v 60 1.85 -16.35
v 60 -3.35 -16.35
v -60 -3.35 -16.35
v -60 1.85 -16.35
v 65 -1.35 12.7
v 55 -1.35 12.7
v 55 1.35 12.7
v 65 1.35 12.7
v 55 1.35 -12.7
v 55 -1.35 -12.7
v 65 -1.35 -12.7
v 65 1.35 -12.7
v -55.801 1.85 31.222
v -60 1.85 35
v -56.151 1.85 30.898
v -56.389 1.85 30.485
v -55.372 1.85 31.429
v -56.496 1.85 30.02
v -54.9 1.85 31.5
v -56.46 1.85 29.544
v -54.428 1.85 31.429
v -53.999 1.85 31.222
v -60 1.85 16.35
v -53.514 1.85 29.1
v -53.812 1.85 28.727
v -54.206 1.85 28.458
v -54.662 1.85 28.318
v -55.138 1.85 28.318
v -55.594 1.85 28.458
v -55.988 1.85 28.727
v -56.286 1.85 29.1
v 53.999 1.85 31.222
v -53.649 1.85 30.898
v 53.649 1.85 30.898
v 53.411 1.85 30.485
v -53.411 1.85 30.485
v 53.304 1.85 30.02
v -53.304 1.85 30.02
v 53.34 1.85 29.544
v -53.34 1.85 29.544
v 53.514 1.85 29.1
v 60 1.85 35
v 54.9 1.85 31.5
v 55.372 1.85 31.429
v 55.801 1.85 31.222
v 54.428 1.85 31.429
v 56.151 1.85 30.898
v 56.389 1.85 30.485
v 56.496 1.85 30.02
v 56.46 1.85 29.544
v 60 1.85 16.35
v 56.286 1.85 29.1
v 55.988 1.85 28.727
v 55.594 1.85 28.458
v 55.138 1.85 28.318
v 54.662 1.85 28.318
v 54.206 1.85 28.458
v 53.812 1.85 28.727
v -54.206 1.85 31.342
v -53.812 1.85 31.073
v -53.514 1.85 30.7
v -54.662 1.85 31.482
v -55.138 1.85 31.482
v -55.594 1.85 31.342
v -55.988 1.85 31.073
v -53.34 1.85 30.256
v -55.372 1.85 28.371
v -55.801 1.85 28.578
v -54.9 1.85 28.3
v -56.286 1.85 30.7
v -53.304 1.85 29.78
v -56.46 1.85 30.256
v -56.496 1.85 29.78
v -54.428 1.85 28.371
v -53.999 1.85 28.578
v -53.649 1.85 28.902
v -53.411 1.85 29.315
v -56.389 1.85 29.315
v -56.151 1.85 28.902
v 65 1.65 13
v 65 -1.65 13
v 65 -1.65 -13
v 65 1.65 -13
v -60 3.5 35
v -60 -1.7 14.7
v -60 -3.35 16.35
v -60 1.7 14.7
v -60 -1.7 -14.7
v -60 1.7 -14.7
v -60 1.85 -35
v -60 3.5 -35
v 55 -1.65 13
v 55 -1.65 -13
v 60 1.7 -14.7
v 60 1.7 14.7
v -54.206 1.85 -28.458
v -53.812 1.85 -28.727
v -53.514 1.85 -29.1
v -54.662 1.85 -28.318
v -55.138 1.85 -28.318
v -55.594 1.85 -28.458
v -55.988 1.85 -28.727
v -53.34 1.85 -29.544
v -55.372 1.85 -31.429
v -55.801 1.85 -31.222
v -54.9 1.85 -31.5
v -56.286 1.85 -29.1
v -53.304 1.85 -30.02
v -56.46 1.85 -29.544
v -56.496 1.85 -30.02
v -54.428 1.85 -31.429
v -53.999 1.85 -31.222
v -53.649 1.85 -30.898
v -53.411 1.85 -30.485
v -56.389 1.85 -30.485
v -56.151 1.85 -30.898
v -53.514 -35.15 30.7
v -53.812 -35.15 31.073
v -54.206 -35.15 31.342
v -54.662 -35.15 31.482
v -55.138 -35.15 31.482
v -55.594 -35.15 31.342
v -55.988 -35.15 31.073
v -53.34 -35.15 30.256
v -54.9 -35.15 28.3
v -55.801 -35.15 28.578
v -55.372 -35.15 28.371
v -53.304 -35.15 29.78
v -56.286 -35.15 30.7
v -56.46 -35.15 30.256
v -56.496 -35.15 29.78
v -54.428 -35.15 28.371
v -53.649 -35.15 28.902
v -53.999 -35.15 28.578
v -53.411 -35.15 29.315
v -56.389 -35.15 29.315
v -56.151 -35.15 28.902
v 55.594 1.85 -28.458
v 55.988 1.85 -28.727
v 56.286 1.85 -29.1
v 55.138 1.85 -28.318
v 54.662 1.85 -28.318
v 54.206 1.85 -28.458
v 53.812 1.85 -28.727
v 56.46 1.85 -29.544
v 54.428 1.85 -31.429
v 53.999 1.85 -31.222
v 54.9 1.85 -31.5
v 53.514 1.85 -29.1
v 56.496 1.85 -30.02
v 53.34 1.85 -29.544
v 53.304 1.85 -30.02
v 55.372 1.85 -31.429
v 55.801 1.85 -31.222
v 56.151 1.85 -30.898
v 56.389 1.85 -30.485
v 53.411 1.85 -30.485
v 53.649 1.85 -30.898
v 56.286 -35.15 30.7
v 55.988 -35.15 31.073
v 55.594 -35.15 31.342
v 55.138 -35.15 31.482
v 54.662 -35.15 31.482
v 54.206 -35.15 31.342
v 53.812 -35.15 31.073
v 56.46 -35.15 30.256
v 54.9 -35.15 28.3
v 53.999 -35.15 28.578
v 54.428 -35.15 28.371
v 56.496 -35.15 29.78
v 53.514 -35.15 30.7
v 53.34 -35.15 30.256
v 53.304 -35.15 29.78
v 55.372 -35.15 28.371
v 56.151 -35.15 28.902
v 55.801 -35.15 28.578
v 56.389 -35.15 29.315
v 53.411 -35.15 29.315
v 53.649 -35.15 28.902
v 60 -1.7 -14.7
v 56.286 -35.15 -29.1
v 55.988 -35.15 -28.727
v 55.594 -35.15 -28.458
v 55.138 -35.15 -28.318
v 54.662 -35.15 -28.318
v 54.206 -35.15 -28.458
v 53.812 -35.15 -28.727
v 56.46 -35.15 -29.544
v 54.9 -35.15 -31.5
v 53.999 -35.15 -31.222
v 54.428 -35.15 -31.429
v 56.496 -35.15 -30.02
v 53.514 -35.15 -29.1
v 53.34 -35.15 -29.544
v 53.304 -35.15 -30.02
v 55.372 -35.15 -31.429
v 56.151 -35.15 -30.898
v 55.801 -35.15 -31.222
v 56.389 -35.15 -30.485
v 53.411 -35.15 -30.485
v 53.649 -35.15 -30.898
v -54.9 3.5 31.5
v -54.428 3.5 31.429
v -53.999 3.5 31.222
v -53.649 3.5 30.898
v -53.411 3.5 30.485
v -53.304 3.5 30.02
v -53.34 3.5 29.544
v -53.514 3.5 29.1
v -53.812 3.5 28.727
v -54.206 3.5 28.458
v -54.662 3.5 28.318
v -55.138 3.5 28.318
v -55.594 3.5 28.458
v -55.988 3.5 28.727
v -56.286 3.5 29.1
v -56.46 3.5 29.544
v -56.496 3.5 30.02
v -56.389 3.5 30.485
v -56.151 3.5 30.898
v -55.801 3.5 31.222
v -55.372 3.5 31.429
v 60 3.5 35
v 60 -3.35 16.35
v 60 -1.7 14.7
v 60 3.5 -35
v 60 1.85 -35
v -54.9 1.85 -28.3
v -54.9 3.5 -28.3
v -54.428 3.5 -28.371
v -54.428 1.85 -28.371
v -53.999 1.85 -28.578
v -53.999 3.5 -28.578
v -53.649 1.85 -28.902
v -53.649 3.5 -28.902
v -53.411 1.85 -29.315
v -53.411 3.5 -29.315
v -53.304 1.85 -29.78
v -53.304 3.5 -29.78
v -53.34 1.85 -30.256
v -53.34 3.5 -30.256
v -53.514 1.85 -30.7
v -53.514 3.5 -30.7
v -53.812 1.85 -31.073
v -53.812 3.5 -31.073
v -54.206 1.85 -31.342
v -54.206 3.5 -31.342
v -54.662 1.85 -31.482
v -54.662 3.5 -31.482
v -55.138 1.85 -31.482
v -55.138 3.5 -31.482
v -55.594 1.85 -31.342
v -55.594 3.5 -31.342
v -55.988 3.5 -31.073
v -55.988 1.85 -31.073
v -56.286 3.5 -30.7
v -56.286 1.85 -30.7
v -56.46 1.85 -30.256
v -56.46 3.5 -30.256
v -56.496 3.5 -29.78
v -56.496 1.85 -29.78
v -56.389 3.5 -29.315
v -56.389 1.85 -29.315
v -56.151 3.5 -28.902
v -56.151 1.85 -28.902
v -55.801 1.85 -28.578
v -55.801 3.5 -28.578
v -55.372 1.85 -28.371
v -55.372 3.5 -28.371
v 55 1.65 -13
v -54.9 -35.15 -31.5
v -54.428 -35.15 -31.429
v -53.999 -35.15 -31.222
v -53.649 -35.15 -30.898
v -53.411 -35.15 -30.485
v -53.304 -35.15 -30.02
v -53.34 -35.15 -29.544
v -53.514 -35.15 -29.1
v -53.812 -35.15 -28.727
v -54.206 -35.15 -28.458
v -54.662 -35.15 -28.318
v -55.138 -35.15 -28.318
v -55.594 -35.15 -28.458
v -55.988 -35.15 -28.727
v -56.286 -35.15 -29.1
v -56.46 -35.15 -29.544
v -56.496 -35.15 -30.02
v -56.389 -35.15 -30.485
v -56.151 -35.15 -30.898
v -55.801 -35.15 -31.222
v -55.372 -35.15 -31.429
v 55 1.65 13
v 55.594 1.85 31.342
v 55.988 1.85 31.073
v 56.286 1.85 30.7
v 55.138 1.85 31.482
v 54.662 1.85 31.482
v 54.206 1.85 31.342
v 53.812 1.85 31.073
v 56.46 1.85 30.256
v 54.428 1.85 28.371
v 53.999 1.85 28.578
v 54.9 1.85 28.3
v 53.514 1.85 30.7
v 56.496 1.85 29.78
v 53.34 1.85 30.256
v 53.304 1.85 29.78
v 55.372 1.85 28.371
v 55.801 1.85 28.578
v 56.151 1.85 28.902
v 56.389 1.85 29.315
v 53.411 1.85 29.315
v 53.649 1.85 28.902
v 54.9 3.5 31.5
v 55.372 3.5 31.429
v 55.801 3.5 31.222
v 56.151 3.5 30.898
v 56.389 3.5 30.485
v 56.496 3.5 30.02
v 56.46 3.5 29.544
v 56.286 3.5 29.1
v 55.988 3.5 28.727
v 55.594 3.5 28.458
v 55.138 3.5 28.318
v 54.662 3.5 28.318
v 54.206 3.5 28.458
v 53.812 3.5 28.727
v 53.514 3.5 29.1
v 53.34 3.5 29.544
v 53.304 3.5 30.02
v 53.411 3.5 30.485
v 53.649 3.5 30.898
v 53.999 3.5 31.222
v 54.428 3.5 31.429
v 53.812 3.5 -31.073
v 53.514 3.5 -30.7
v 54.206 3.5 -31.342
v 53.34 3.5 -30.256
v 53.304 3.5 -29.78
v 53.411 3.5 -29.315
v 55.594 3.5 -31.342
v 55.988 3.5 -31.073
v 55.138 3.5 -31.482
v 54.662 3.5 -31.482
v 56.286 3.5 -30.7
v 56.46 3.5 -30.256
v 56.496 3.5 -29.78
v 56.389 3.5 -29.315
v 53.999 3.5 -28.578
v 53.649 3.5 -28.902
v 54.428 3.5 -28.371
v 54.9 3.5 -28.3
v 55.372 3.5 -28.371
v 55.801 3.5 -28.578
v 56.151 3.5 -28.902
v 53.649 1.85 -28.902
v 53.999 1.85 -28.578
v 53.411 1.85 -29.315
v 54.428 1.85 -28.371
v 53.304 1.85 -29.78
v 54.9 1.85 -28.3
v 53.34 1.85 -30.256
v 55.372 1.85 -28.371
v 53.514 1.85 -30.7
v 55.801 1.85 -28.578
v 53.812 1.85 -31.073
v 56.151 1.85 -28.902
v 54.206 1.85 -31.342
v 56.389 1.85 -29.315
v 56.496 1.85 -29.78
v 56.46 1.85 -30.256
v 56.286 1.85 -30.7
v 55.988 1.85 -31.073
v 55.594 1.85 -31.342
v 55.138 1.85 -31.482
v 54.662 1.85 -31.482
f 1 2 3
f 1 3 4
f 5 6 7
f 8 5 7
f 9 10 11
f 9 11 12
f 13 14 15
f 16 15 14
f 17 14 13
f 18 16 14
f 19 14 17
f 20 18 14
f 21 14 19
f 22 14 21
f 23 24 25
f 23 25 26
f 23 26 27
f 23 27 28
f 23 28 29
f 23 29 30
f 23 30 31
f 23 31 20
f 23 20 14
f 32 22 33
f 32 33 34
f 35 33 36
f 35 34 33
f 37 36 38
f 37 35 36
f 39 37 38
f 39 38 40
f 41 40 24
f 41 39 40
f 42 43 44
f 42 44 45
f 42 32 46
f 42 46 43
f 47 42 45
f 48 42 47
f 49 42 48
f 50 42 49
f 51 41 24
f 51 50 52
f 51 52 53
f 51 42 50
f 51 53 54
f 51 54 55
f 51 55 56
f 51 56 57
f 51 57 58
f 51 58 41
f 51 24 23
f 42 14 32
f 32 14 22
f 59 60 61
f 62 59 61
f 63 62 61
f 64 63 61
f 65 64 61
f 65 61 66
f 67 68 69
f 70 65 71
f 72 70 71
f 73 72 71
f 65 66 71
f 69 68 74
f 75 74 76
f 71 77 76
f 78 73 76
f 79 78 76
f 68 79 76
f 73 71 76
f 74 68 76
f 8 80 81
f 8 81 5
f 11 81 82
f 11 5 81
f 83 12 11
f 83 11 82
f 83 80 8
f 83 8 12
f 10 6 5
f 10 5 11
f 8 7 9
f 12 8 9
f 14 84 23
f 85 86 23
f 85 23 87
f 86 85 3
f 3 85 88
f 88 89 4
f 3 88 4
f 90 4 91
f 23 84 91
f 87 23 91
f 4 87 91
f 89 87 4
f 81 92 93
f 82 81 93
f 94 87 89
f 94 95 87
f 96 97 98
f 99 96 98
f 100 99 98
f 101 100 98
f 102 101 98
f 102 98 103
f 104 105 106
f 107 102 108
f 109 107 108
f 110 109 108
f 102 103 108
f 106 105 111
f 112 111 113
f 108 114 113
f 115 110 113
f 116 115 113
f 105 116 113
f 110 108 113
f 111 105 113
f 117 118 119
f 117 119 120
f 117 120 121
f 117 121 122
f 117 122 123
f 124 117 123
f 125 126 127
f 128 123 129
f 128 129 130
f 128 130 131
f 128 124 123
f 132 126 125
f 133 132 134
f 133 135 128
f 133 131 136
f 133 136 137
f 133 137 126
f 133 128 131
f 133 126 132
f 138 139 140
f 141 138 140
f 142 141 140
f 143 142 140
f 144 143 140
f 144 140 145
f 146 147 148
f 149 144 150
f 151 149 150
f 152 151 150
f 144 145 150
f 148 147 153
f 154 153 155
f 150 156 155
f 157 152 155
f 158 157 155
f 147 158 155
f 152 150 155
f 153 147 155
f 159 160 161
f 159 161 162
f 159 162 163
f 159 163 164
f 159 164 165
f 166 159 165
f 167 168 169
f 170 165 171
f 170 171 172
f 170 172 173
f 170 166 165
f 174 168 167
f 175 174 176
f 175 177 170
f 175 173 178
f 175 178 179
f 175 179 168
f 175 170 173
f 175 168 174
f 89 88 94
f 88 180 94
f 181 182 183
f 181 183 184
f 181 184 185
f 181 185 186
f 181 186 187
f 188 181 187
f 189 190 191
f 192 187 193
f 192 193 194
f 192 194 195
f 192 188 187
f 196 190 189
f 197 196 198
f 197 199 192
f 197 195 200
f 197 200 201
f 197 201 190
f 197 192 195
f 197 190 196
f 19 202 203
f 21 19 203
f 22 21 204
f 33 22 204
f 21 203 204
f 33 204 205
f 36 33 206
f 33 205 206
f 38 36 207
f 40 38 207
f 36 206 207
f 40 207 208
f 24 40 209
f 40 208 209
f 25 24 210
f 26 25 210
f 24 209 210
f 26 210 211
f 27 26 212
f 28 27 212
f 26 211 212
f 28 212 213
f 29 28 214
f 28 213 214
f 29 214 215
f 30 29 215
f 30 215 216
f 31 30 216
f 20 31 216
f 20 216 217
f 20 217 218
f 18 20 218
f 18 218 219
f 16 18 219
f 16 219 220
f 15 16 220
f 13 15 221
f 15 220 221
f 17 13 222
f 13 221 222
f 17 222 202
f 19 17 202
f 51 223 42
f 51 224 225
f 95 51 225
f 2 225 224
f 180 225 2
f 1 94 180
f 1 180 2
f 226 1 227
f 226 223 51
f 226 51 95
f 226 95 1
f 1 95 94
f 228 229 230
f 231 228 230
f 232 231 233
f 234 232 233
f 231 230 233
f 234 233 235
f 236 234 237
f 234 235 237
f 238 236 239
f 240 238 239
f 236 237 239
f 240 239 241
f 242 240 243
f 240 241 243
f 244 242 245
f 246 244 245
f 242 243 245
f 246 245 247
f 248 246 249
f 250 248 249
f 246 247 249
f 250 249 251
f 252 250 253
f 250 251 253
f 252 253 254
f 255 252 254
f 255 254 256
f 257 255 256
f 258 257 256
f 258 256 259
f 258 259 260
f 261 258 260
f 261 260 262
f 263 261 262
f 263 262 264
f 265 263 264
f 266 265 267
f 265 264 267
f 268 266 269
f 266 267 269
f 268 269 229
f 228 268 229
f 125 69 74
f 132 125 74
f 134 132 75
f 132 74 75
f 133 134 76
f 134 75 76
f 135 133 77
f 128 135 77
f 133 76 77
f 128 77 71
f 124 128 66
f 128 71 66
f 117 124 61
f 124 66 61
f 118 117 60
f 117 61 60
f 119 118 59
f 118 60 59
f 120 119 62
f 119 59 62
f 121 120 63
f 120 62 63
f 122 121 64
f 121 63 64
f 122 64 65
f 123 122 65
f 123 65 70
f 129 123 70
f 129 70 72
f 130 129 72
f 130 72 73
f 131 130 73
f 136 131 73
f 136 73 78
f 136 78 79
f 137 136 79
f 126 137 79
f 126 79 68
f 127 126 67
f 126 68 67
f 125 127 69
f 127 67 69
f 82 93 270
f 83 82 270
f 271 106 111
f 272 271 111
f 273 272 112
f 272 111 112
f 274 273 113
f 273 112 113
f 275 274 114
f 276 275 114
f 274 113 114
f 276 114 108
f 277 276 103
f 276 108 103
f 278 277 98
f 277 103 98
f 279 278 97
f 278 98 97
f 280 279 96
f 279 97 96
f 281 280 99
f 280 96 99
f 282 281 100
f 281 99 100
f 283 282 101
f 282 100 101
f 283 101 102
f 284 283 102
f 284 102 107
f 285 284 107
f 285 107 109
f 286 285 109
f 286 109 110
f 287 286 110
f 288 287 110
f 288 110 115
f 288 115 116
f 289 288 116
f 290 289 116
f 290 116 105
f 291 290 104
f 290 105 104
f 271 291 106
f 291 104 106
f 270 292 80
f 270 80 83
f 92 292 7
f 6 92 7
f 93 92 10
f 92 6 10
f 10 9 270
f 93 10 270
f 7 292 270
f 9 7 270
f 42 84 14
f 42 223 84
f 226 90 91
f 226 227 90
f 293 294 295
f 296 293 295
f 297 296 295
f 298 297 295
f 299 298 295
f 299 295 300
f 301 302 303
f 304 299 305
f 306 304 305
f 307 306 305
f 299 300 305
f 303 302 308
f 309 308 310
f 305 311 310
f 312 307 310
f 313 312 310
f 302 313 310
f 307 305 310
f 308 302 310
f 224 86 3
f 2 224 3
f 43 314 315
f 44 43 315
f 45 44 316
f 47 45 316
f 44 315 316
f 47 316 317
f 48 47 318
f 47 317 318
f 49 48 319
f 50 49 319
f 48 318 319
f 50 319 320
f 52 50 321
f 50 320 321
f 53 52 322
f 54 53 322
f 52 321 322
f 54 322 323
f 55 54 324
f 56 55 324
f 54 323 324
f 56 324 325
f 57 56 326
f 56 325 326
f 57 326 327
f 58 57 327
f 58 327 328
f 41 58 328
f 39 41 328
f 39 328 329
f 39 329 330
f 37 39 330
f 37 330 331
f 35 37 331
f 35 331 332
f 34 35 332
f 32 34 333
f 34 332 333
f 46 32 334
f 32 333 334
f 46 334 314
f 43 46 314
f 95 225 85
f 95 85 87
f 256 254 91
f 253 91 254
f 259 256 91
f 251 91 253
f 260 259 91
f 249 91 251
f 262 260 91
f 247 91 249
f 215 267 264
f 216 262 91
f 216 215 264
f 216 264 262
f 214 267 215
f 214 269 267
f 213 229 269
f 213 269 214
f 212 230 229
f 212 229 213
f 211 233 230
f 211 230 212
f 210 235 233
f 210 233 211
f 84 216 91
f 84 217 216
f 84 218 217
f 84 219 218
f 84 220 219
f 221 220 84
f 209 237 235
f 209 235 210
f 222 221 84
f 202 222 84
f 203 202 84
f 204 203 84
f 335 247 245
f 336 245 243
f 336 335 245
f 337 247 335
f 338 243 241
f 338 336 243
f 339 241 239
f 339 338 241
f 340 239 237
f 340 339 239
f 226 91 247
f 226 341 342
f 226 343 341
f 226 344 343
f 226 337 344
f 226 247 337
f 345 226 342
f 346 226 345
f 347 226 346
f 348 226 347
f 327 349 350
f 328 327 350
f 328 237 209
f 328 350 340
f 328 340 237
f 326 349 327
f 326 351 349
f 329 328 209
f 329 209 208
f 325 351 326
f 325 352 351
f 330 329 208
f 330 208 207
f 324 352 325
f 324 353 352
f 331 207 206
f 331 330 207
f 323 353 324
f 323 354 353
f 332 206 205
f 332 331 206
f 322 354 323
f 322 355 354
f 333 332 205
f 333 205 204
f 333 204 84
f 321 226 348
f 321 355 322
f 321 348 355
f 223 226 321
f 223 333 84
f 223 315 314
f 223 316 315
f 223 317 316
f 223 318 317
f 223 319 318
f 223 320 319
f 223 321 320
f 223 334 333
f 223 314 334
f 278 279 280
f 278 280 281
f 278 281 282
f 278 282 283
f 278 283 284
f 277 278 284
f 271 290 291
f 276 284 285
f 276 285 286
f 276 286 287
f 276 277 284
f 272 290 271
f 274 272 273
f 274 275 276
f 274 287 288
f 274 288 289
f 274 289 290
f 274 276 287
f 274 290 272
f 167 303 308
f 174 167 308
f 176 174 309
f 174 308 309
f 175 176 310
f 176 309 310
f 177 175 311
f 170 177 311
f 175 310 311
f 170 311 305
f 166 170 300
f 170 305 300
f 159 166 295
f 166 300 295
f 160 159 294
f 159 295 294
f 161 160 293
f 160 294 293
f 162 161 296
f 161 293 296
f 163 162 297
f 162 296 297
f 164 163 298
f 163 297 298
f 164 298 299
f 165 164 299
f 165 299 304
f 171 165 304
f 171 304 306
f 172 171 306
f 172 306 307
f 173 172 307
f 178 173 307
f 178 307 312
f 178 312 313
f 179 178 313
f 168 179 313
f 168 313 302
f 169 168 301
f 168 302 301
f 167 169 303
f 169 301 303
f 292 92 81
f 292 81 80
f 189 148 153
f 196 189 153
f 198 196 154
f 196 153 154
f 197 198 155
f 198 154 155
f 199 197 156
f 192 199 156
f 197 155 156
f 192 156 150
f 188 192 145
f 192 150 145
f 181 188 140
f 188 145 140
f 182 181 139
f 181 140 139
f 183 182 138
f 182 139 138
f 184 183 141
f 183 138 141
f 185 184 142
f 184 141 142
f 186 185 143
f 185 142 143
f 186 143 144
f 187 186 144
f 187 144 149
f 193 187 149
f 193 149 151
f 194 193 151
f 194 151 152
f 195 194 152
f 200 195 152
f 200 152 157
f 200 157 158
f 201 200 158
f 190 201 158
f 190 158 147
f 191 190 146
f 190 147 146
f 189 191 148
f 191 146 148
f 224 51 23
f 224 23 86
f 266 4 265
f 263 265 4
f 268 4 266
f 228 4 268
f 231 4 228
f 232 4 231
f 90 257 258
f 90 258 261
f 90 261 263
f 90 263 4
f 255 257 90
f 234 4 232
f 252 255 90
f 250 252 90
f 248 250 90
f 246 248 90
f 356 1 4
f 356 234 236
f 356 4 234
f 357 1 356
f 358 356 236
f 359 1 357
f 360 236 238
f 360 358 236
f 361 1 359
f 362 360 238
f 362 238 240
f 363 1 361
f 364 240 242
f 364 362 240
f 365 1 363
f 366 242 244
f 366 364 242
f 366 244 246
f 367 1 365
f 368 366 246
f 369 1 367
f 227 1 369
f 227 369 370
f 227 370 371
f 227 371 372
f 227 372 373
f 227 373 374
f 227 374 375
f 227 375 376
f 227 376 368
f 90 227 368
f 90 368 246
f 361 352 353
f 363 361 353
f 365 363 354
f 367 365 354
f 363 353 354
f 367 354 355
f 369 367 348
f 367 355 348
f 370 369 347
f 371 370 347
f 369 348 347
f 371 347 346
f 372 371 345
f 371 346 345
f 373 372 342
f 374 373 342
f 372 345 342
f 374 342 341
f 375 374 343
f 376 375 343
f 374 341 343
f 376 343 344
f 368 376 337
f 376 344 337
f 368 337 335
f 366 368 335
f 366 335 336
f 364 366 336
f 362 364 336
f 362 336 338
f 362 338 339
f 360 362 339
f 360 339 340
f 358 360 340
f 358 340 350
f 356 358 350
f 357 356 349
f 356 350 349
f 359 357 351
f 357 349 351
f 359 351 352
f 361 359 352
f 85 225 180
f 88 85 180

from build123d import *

# Parameters (mm, degrees)
SKETCH1_W                = 29.4
SKETCH1_H                = 3.4
BOSS_EXTRUDE1_DEPTH      = 60
SKETCH2_R                = 1.6
CUT_EXTRUDE2_DEPTH       = 1.65
BOSS_EXTRUDE2_DEPTH      = 5
BOSS_EXTRUDE2_DEPTH_BACK = 5
SKETCH3_W                = 26
SKETCH3_H                = 3.3
SKETCH3_W_2              = 25.4
SKETCH3_H_2              = 2.7
SKETCH4_R                = 1.6
BOSS_EXTRUDE3_DEPTH      = 37
BOSS_EXTRUDE3_2_DEPTH    = 37
BOSS_EXTRUDE3_3_DEPTH    = 37
BOSS_EXTRUDE3_4_DEPTH    = 37


with BuildPart() as part:
    # Sketch1 → Boss-Extrude1 (new, symmetric)
    with BuildSketch(Plane(origin=(0, 0, 0), x_dir=(0, 0, -1), z_dir=(1, 0, 0))):
        Polygon((-35, 1.85), (-16.35, 1.85), (-16.35, -3.35), (16.35, -3.35), (16.35, 1.85), (35, 1.85), (35, 3.5), (-35, 3.5), align=None)
        Rectangle(SKETCH1_W, SKETCH1_H, mode=Mode.SUBTRACT)
    extrude(amount=BOSS_EXTRUDE1_DEPTH, both=True)

    # Sketch2 → Cut-Extrude2 (cut)
    with BuildSketch(Plane(origin=(0, 3.5, 0), x_dir=(1, 0, 0), z_dir=(0, 1, 0))):
        with Locations(Location((-54.9, 29.9, 0), (0, 0, 270))):
            Circle(SKETCH2_R)
        with Locations(Location((-54.9, -29.9, 0), (0, 0, 270))):
            Circle(SKETCH2_R)
        with Locations(Location((54.9, -29.9, 0), (0, 0, 270))):
            Circle(SKETCH2_R)
        with Locations(Location((54.9, 29.9, 0), (0, 0, 270))):
            Circle(SKETCH2_R)
    extrude(amount=-CUT_EXTRUDE2_DEPTH, mode=Mode.SUBTRACT)


with BuildPart() as body_2:
    # Sketch3 → Boss-Extrude2 (new, two sides: drawn at the far end of the back side and taken through both)
    with BuildSketch(Plane(origin=(60, 0, 0), x_dir=(0, 0, -1), z_dir=(1, 0, 0)).offset(-BOSS_EXTRUDE2_DEPTH_BACK)):
        Rectangle(SKETCH3_W, SKETCH3_H)
        Rectangle(SKETCH3_W_2, SKETCH3_H_2, mode=Mode.SUBTRACT)
    extrude(amount=BOSS_EXTRUDE2_DEPTH + BOSS_EXTRUDE2_DEPTH_BACK)


with BuildPart() as body_3:
    # Sketch4 → Boss-Extrude3 (new body)
    with BuildSketch(Plane.XZ.offset(-1.85)):
        with Locations(Location((-54.9, -29.9, 0), (0, 0, 270))):
            Circle(SKETCH4_R)
    extrude(amount=BOSS_EXTRUDE3_DEPTH)


with BuildPart() as body_4:
    # Sketch4 → Boss-Extrude3 2 (new body)
    with BuildSketch(Plane.XZ.offset(-1.85)):
        with Locations(Location((54.9, -29.9, 0), (0, 0, 270))):
            Circle(SKETCH4_R)
    extrude(amount=BOSS_EXTRUDE3_2_DEPTH)


with BuildPart() as body_5:
    # Sketch4 → Boss-Extrude3 3 (new body)
    with BuildSketch(Plane.XZ.offset(-1.85)):
        with Locations(Location((54.9, 29.9, 0), (0, 0, 270))):
            Circle(SKETCH4_R)
    extrude(amount=BOSS_EXTRUDE3_3_DEPTH)


with BuildPart() as body_6:
    # Sketch4 → Boss-Extrude3 4 (new body)
    with BuildSketch(Plane.XZ.offset(-1.85)):
        with Locations(Location((-54.9, 29.9, 0), (0, 0, 270))):
            Circle(SKETCH4_R)
    extrude(amount=BOSS_EXTRUDE3_4_DEPTH)


solid = Compound([part.part, body_2.part, body_3.part, body_4.part, body_5.part, body_6.part])
